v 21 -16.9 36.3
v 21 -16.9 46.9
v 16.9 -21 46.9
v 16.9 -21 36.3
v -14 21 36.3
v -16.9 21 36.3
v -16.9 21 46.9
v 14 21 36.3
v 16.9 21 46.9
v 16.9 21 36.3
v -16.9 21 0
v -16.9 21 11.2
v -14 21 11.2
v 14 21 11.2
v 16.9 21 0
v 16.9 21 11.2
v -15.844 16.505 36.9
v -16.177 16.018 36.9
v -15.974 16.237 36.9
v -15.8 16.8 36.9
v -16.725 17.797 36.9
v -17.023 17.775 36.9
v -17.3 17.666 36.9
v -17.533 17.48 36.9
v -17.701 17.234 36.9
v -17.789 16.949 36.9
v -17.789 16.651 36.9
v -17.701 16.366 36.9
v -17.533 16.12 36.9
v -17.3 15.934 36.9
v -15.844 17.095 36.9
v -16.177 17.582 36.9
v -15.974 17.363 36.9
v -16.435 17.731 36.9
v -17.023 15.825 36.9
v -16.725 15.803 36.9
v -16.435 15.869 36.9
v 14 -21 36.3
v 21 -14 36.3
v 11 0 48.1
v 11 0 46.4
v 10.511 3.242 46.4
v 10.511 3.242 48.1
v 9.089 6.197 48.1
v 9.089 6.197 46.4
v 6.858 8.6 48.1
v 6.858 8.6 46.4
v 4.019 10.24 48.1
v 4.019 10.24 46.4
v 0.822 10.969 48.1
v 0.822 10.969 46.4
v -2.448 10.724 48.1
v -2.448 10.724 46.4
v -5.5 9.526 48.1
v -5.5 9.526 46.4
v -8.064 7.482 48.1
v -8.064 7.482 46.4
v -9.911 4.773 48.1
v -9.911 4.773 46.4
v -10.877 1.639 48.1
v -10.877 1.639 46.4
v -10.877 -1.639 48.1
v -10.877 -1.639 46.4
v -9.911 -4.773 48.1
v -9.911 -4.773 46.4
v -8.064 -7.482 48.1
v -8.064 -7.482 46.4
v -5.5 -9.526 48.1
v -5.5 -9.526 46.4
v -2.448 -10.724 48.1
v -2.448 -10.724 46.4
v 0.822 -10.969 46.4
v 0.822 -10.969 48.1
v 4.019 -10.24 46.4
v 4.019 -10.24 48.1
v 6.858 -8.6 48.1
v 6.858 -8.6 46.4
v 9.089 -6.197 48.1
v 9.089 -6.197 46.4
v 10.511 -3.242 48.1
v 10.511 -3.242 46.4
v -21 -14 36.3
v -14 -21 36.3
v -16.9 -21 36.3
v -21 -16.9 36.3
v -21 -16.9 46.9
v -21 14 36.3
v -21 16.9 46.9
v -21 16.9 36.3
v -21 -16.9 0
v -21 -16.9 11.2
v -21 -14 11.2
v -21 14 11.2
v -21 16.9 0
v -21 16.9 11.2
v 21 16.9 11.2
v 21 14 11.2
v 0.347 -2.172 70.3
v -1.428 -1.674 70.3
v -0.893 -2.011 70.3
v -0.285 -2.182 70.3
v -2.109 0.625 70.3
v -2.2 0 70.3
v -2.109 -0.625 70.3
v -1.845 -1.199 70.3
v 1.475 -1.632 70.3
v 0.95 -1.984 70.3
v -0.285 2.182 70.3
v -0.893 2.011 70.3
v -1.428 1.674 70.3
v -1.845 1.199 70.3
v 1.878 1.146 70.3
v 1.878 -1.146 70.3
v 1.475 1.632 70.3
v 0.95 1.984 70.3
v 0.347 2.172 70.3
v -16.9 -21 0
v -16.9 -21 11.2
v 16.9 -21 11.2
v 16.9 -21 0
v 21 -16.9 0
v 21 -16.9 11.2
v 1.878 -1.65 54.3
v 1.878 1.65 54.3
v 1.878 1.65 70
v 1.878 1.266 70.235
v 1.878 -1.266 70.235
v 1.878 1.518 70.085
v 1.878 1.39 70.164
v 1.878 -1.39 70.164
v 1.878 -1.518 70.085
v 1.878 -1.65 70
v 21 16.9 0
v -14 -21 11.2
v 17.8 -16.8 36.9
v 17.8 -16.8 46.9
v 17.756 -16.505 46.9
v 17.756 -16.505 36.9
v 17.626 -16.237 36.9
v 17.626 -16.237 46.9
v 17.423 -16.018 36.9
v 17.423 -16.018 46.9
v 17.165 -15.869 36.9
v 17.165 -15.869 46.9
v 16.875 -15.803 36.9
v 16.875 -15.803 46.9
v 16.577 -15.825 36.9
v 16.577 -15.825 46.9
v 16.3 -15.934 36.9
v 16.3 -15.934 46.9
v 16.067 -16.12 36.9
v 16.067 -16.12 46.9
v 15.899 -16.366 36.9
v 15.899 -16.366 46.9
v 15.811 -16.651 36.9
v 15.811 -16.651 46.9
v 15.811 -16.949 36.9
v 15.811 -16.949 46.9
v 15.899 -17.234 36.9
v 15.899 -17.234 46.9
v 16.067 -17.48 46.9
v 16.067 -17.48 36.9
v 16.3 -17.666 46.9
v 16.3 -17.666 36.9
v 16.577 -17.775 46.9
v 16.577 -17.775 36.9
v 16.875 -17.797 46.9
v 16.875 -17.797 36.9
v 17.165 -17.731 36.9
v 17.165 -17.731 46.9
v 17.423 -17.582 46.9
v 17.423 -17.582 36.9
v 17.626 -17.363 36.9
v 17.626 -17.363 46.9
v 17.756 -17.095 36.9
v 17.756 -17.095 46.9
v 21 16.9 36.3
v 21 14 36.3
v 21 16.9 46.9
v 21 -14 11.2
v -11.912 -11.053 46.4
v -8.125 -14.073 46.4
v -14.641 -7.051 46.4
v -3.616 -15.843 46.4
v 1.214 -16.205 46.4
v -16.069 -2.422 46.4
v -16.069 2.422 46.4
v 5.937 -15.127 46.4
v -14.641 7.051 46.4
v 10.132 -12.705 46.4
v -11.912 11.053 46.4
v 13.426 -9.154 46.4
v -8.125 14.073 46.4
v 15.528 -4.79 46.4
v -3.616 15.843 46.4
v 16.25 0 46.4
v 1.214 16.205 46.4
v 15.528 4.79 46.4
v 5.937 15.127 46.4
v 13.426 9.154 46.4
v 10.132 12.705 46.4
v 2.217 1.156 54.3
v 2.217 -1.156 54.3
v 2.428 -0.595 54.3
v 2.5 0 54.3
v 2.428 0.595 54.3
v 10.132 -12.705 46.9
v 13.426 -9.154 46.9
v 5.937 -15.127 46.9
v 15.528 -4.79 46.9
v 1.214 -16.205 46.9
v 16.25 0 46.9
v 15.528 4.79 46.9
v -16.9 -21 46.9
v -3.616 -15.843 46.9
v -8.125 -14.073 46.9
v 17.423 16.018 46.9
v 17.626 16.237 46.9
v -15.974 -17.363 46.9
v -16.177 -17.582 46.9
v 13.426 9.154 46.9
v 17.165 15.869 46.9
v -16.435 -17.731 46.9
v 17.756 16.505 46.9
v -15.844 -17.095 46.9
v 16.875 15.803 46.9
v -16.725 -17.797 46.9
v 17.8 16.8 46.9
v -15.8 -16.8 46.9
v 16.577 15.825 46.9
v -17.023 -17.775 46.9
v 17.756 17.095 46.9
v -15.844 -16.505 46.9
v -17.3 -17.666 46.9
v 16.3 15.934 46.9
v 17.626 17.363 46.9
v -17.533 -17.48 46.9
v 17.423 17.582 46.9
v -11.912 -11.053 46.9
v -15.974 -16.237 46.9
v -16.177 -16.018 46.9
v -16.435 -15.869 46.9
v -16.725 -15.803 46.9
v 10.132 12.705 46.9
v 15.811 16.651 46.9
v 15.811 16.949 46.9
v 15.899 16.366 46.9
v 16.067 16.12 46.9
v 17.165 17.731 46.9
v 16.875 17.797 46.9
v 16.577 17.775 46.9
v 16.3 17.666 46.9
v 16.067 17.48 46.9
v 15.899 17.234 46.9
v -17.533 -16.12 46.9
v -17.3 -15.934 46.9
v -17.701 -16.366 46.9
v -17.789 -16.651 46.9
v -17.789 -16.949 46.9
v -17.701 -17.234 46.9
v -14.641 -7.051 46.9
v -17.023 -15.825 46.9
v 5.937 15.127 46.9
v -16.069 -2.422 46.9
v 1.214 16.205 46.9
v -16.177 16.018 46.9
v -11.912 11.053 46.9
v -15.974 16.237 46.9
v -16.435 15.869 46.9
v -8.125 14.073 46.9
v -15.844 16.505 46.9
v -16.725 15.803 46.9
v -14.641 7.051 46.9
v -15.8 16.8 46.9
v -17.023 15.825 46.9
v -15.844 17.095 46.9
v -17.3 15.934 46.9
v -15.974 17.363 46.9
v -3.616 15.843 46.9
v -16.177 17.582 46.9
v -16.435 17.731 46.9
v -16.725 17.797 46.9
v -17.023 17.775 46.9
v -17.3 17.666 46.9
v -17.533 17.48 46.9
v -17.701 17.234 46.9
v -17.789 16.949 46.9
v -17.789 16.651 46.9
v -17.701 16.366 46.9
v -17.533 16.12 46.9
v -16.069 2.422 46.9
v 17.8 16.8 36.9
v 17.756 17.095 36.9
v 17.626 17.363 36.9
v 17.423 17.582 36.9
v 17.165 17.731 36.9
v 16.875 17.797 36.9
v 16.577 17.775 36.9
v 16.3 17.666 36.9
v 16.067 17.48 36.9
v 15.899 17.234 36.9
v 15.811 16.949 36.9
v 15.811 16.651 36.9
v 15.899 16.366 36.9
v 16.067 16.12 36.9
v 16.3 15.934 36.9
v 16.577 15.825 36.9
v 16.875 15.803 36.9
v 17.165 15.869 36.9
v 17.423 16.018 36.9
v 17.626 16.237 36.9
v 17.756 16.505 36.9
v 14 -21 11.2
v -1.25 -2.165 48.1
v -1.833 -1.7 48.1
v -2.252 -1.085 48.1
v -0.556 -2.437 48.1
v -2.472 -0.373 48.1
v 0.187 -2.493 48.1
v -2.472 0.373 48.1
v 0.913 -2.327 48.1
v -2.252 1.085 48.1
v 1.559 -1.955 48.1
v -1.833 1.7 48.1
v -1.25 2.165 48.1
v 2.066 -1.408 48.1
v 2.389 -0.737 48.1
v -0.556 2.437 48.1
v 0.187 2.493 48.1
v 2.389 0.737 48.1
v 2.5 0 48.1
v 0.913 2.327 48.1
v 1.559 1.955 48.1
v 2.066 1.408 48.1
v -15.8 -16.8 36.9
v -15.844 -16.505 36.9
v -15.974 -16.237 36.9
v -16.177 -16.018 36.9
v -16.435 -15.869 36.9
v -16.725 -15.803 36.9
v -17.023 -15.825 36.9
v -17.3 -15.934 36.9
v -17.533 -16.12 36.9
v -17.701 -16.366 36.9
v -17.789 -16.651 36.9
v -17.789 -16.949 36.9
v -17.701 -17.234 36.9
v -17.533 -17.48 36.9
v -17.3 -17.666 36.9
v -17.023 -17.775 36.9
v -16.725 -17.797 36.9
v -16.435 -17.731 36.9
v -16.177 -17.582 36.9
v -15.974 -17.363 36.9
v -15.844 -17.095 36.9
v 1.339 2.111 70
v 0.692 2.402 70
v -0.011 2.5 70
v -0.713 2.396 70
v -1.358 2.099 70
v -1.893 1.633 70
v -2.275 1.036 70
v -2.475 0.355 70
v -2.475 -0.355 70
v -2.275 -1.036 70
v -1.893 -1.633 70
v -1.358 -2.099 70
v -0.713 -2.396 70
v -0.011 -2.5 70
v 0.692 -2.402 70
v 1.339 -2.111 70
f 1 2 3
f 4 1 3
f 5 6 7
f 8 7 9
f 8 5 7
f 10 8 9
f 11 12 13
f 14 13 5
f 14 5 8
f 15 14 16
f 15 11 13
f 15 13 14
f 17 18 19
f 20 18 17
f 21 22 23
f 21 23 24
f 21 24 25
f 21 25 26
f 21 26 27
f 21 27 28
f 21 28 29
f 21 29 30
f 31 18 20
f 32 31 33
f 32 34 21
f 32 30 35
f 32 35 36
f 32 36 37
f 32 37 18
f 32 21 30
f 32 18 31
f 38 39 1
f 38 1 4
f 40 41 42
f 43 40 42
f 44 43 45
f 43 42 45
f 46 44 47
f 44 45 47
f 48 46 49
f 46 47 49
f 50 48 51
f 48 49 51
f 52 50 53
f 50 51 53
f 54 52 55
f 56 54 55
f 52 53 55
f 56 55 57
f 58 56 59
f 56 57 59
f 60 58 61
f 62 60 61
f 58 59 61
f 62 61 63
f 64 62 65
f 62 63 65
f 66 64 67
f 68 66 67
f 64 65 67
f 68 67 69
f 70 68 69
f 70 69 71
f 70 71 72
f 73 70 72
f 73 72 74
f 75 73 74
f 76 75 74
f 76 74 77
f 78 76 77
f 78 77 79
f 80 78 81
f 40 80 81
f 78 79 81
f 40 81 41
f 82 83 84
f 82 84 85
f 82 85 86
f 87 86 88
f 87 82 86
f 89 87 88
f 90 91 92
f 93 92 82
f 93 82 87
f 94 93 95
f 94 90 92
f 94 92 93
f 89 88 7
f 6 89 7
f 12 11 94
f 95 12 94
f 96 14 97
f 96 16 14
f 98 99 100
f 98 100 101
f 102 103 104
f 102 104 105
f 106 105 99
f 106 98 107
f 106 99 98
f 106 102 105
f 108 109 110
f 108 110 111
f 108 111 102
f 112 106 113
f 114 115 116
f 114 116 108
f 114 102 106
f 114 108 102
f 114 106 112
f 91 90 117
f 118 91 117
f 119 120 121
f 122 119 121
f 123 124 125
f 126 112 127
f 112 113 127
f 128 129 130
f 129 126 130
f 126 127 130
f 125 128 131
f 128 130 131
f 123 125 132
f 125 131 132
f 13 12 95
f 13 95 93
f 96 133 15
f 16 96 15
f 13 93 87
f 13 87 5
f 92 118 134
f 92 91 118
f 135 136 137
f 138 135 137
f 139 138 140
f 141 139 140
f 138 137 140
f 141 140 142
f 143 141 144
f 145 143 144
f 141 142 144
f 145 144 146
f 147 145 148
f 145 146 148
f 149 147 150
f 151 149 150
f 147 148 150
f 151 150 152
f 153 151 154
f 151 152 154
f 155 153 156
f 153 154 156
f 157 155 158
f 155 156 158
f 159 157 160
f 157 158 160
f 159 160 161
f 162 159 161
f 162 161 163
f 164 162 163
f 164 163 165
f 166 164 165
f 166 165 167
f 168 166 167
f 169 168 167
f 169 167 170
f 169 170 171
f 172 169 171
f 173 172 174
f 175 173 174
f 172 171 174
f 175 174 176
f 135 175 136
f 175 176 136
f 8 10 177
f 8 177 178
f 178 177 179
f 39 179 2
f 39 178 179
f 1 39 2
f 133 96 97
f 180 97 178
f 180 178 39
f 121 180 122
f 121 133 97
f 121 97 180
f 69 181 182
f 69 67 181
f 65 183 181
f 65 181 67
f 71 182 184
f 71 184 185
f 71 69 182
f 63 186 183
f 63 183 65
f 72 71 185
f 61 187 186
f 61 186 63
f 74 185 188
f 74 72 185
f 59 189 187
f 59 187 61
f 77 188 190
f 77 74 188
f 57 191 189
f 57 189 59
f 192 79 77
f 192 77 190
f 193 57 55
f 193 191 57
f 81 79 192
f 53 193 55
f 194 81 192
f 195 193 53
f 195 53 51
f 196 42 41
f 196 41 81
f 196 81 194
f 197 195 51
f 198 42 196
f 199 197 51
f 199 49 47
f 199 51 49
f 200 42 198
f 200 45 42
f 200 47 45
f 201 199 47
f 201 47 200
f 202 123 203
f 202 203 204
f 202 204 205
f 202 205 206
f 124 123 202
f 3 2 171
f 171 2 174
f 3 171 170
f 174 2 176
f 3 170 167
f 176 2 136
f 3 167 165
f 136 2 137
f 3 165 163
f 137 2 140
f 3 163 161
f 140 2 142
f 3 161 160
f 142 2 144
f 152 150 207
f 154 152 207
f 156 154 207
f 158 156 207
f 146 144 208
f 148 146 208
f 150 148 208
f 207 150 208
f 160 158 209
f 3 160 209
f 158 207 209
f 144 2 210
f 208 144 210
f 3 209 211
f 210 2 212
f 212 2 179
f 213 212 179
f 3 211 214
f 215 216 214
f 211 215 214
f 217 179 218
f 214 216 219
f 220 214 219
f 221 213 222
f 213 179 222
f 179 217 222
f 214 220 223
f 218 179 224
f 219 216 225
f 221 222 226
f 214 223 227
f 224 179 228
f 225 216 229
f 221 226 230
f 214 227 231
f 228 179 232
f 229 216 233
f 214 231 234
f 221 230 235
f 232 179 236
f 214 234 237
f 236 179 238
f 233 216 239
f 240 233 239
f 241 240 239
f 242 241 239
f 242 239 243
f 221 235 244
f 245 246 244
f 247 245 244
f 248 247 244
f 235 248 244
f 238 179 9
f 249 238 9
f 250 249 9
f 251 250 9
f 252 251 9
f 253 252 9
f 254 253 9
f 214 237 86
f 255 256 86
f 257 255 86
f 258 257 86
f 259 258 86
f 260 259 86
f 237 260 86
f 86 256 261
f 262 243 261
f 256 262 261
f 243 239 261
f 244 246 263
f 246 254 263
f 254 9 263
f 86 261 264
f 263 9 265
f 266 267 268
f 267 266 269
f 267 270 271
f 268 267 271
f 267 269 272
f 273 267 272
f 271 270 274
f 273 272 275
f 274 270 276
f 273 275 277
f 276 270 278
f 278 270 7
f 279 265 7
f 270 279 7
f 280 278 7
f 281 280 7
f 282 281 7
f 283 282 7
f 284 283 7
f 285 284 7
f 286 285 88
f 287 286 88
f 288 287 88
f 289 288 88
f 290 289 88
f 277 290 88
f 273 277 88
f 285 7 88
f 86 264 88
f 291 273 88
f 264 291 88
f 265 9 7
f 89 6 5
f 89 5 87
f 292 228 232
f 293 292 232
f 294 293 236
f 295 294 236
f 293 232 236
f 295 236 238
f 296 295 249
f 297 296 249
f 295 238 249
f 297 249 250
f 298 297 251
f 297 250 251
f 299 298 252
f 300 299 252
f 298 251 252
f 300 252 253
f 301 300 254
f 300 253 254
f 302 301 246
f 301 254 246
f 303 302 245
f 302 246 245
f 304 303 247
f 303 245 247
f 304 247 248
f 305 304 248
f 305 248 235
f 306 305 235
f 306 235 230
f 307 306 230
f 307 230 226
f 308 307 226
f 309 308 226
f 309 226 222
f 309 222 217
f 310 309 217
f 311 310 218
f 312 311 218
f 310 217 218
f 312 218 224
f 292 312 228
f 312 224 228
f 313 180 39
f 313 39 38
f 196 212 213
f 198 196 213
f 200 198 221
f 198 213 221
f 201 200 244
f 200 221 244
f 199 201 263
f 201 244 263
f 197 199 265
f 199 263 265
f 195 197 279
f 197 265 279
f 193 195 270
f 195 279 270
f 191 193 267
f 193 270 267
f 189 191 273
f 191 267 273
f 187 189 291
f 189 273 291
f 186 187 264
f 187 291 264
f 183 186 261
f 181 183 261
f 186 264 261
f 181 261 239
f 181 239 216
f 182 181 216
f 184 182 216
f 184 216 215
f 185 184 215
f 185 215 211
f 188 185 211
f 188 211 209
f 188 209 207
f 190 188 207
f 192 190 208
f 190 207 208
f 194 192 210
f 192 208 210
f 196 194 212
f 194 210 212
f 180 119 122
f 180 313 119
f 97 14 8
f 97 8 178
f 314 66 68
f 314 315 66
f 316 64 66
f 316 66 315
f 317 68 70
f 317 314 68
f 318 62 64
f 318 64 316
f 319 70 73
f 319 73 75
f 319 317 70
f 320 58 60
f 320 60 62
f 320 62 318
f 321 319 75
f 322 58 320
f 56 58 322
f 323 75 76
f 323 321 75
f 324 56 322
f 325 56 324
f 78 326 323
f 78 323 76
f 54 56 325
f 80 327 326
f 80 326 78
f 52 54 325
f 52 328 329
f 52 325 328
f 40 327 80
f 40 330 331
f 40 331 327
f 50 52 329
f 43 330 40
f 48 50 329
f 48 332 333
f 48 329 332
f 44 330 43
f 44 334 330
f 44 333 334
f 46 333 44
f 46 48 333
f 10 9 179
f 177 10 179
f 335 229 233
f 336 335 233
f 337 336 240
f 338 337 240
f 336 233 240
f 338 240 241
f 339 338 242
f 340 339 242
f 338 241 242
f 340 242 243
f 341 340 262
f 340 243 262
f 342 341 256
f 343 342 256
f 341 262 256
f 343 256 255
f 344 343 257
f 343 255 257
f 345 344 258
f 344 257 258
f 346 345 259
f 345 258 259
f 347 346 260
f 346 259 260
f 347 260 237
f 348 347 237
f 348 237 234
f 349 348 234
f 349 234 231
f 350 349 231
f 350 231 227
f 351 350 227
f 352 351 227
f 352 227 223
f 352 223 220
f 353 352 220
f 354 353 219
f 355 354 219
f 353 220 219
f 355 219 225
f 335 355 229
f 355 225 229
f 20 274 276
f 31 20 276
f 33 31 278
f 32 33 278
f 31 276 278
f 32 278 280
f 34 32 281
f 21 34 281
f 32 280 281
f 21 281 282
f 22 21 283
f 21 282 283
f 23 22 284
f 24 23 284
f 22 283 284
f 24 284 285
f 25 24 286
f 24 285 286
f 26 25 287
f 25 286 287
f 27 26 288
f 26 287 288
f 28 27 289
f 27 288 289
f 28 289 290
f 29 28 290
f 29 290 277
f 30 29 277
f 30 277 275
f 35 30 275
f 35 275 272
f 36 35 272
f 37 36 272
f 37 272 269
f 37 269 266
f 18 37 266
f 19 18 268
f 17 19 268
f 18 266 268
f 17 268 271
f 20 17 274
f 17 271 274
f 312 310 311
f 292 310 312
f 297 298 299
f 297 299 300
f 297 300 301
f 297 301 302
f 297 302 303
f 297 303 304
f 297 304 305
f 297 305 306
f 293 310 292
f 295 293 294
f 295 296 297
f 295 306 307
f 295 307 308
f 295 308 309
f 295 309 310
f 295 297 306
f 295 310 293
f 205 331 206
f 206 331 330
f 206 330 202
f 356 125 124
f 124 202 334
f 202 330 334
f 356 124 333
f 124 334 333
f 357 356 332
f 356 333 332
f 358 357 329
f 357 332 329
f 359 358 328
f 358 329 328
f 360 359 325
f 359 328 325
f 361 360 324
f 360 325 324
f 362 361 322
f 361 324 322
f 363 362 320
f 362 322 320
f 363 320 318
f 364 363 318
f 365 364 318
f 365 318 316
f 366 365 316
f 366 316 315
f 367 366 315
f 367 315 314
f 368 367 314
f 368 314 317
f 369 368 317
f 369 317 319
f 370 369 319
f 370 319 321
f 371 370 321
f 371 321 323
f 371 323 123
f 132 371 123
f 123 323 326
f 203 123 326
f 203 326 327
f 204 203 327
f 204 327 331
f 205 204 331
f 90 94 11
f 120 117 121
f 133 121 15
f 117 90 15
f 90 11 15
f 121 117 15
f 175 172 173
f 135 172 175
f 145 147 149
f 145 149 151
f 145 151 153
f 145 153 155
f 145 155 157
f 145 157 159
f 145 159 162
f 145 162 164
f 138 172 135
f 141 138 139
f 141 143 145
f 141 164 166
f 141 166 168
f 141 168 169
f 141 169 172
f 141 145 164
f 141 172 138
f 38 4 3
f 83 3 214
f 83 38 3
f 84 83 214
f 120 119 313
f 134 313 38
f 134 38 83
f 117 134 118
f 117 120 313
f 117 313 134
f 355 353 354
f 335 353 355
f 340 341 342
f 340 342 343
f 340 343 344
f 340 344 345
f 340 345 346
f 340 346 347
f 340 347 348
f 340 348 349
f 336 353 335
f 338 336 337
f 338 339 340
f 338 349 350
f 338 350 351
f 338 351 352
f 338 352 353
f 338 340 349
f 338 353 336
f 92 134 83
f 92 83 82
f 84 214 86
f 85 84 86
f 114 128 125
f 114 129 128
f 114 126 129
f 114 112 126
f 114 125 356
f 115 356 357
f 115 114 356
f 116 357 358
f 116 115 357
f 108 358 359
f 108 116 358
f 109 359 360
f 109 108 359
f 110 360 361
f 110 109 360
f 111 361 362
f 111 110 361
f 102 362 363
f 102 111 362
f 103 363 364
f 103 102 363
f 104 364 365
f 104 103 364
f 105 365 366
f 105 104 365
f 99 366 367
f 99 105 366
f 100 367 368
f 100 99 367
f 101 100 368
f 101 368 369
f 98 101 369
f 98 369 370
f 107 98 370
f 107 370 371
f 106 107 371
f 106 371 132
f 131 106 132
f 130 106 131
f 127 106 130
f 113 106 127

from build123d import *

# Parameters (mm, degrees)
BOSS_EXTRU_1_DEPTH      = 11.2
BOSS_EXTRU_2_DEPTH      = 25.1
BOSS_EXTRU_3_DEPTH      = 10.6
ESQUISSE4_R             = 16.25
ENL_V_MAT_EXTRU_1_DEPTH = 0.5
ESQUISSE5_R             = 11
BOSS_EXTRU_4_DEPTH      = 1.7
ESQUISSE6_R             = 2.5
BOSS_EXTRU_5_DEPTH      = 22.2
CHANFREIN1_SIZE         = 0.3
ENL_V_MAT_EXTRU_2_DEPTH = 16
ESQUISSE8_R             = 1
ENL_V_MAT_EXTRU_3_DEPTH = 10


with BuildPart() as part:
    # Esquisse1 → Boss.-Extru.1 (new body)
    with BuildSketch(Plane.XY):
        Polygon((21, -16.9), (21, 16.9), (16.9, 21), (-16.9, 21), (-21, 16.9), (-21, -16.9), (-16.9, -21), (16.9, -21), align=None)
    extrude(amount=BOSS_EXTRU_1_DEPTH)

    # Esquisse2 → Boss.-Extru.2 (add)
    with BuildSketch(Plane.XY.offset(11.2)):
        Polygon((14, 21), (21, 14), (21, -14), (14, -21), (-14, -21), (-21, -14), (-21, 14), (-14, 21), align=None)
    extrude(amount=BOSS_EXTRU_2_DEPTH)

    # Esquisse3 → Boss.-Extru.3 (add)
    with BuildSketch(Plane.XY.offset(36.3)):
        Polygon((16.9, 21), (21, 16.9), (21, -16.9), (16.9, -21), (-16.9, -21), (-21, -16.9), (-21, 16.9), (-16.9, 21), align=None)
    extrude(amount=BOSS_EXTRU_3_DEPTH)

    # Esquisse4 → Enlèv. mat.-Extru.1 (cut)
    with BuildSketch(Plane.XY.offset(46.9)):
        Circle(ESQUISSE4_R)
    extrude(amount=-ENL_V_MAT_EXTRU_1_DEPTH, mode=Mode.SUBTRACT)

    # Esquisse5 → Boss.-Extru.4 (add)
    with BuildSketch(Plane.XY.offset(46.4)):
        Circle(ESQUISSE5_R)
    extrude(amount=BOSS_EXTRU_4_DEPTH)

    # Esquisse6 → Boss.-Extru.5 (add)
    with BuildSketch(Plane.XY.offset(48.1)):
        Circle(ESQUISSE6_R)
    extrude(amount=BOSS_EXTRU_5_DEPTH)

    # Chanfrein1
    chanfrein1_edges = [part.edges().sort_by_distance(p)[0] for p in [
        (-2.5, 0, 70.3),
    ]]
    chamfer(chanfrein1_edges, length=CHANFREIN1_SIZE)

    # Esquisse7 → Enlèv. mat.-Extru.2 (cut)
    with BuildSketch(Plane.XY.offset(70.3)):
        with BuildLine():
            Line((1.878163997, 1.65), (1.878163997, -1.65))
            ThreePointArc((1.878163997, -1.65), (2.5, 0), (1.878163997, 1.65))
        make_face()
    extrude(amount=-ENL_V_MAT_EXTRU_2_DEPTH, mode=Mode.SUBTRACT)

    # Esquisse8 → Enlèv. mat.-Extru.3 (cut)
    with BuildSketch(Plane.XY.offset(46.9)):
        with Locations((-16.8, 16.8)):
            Circle(ESQUISSE8_R)
        with Locations((-16.8, -16.8)):
            Circle(ESQUISSE8_R)
        with Locations((16.8, -16.8)):
            Circle(ESQUISSE8_R)
        with Locations((16.8, 16.8)):
            Circle(ESQUISSE8_R)
    extrude(amount=-ENL_V_MAT_EXTRU_3_DEPTH, mode=Mode.SUBTRACT)


solid = part.part
